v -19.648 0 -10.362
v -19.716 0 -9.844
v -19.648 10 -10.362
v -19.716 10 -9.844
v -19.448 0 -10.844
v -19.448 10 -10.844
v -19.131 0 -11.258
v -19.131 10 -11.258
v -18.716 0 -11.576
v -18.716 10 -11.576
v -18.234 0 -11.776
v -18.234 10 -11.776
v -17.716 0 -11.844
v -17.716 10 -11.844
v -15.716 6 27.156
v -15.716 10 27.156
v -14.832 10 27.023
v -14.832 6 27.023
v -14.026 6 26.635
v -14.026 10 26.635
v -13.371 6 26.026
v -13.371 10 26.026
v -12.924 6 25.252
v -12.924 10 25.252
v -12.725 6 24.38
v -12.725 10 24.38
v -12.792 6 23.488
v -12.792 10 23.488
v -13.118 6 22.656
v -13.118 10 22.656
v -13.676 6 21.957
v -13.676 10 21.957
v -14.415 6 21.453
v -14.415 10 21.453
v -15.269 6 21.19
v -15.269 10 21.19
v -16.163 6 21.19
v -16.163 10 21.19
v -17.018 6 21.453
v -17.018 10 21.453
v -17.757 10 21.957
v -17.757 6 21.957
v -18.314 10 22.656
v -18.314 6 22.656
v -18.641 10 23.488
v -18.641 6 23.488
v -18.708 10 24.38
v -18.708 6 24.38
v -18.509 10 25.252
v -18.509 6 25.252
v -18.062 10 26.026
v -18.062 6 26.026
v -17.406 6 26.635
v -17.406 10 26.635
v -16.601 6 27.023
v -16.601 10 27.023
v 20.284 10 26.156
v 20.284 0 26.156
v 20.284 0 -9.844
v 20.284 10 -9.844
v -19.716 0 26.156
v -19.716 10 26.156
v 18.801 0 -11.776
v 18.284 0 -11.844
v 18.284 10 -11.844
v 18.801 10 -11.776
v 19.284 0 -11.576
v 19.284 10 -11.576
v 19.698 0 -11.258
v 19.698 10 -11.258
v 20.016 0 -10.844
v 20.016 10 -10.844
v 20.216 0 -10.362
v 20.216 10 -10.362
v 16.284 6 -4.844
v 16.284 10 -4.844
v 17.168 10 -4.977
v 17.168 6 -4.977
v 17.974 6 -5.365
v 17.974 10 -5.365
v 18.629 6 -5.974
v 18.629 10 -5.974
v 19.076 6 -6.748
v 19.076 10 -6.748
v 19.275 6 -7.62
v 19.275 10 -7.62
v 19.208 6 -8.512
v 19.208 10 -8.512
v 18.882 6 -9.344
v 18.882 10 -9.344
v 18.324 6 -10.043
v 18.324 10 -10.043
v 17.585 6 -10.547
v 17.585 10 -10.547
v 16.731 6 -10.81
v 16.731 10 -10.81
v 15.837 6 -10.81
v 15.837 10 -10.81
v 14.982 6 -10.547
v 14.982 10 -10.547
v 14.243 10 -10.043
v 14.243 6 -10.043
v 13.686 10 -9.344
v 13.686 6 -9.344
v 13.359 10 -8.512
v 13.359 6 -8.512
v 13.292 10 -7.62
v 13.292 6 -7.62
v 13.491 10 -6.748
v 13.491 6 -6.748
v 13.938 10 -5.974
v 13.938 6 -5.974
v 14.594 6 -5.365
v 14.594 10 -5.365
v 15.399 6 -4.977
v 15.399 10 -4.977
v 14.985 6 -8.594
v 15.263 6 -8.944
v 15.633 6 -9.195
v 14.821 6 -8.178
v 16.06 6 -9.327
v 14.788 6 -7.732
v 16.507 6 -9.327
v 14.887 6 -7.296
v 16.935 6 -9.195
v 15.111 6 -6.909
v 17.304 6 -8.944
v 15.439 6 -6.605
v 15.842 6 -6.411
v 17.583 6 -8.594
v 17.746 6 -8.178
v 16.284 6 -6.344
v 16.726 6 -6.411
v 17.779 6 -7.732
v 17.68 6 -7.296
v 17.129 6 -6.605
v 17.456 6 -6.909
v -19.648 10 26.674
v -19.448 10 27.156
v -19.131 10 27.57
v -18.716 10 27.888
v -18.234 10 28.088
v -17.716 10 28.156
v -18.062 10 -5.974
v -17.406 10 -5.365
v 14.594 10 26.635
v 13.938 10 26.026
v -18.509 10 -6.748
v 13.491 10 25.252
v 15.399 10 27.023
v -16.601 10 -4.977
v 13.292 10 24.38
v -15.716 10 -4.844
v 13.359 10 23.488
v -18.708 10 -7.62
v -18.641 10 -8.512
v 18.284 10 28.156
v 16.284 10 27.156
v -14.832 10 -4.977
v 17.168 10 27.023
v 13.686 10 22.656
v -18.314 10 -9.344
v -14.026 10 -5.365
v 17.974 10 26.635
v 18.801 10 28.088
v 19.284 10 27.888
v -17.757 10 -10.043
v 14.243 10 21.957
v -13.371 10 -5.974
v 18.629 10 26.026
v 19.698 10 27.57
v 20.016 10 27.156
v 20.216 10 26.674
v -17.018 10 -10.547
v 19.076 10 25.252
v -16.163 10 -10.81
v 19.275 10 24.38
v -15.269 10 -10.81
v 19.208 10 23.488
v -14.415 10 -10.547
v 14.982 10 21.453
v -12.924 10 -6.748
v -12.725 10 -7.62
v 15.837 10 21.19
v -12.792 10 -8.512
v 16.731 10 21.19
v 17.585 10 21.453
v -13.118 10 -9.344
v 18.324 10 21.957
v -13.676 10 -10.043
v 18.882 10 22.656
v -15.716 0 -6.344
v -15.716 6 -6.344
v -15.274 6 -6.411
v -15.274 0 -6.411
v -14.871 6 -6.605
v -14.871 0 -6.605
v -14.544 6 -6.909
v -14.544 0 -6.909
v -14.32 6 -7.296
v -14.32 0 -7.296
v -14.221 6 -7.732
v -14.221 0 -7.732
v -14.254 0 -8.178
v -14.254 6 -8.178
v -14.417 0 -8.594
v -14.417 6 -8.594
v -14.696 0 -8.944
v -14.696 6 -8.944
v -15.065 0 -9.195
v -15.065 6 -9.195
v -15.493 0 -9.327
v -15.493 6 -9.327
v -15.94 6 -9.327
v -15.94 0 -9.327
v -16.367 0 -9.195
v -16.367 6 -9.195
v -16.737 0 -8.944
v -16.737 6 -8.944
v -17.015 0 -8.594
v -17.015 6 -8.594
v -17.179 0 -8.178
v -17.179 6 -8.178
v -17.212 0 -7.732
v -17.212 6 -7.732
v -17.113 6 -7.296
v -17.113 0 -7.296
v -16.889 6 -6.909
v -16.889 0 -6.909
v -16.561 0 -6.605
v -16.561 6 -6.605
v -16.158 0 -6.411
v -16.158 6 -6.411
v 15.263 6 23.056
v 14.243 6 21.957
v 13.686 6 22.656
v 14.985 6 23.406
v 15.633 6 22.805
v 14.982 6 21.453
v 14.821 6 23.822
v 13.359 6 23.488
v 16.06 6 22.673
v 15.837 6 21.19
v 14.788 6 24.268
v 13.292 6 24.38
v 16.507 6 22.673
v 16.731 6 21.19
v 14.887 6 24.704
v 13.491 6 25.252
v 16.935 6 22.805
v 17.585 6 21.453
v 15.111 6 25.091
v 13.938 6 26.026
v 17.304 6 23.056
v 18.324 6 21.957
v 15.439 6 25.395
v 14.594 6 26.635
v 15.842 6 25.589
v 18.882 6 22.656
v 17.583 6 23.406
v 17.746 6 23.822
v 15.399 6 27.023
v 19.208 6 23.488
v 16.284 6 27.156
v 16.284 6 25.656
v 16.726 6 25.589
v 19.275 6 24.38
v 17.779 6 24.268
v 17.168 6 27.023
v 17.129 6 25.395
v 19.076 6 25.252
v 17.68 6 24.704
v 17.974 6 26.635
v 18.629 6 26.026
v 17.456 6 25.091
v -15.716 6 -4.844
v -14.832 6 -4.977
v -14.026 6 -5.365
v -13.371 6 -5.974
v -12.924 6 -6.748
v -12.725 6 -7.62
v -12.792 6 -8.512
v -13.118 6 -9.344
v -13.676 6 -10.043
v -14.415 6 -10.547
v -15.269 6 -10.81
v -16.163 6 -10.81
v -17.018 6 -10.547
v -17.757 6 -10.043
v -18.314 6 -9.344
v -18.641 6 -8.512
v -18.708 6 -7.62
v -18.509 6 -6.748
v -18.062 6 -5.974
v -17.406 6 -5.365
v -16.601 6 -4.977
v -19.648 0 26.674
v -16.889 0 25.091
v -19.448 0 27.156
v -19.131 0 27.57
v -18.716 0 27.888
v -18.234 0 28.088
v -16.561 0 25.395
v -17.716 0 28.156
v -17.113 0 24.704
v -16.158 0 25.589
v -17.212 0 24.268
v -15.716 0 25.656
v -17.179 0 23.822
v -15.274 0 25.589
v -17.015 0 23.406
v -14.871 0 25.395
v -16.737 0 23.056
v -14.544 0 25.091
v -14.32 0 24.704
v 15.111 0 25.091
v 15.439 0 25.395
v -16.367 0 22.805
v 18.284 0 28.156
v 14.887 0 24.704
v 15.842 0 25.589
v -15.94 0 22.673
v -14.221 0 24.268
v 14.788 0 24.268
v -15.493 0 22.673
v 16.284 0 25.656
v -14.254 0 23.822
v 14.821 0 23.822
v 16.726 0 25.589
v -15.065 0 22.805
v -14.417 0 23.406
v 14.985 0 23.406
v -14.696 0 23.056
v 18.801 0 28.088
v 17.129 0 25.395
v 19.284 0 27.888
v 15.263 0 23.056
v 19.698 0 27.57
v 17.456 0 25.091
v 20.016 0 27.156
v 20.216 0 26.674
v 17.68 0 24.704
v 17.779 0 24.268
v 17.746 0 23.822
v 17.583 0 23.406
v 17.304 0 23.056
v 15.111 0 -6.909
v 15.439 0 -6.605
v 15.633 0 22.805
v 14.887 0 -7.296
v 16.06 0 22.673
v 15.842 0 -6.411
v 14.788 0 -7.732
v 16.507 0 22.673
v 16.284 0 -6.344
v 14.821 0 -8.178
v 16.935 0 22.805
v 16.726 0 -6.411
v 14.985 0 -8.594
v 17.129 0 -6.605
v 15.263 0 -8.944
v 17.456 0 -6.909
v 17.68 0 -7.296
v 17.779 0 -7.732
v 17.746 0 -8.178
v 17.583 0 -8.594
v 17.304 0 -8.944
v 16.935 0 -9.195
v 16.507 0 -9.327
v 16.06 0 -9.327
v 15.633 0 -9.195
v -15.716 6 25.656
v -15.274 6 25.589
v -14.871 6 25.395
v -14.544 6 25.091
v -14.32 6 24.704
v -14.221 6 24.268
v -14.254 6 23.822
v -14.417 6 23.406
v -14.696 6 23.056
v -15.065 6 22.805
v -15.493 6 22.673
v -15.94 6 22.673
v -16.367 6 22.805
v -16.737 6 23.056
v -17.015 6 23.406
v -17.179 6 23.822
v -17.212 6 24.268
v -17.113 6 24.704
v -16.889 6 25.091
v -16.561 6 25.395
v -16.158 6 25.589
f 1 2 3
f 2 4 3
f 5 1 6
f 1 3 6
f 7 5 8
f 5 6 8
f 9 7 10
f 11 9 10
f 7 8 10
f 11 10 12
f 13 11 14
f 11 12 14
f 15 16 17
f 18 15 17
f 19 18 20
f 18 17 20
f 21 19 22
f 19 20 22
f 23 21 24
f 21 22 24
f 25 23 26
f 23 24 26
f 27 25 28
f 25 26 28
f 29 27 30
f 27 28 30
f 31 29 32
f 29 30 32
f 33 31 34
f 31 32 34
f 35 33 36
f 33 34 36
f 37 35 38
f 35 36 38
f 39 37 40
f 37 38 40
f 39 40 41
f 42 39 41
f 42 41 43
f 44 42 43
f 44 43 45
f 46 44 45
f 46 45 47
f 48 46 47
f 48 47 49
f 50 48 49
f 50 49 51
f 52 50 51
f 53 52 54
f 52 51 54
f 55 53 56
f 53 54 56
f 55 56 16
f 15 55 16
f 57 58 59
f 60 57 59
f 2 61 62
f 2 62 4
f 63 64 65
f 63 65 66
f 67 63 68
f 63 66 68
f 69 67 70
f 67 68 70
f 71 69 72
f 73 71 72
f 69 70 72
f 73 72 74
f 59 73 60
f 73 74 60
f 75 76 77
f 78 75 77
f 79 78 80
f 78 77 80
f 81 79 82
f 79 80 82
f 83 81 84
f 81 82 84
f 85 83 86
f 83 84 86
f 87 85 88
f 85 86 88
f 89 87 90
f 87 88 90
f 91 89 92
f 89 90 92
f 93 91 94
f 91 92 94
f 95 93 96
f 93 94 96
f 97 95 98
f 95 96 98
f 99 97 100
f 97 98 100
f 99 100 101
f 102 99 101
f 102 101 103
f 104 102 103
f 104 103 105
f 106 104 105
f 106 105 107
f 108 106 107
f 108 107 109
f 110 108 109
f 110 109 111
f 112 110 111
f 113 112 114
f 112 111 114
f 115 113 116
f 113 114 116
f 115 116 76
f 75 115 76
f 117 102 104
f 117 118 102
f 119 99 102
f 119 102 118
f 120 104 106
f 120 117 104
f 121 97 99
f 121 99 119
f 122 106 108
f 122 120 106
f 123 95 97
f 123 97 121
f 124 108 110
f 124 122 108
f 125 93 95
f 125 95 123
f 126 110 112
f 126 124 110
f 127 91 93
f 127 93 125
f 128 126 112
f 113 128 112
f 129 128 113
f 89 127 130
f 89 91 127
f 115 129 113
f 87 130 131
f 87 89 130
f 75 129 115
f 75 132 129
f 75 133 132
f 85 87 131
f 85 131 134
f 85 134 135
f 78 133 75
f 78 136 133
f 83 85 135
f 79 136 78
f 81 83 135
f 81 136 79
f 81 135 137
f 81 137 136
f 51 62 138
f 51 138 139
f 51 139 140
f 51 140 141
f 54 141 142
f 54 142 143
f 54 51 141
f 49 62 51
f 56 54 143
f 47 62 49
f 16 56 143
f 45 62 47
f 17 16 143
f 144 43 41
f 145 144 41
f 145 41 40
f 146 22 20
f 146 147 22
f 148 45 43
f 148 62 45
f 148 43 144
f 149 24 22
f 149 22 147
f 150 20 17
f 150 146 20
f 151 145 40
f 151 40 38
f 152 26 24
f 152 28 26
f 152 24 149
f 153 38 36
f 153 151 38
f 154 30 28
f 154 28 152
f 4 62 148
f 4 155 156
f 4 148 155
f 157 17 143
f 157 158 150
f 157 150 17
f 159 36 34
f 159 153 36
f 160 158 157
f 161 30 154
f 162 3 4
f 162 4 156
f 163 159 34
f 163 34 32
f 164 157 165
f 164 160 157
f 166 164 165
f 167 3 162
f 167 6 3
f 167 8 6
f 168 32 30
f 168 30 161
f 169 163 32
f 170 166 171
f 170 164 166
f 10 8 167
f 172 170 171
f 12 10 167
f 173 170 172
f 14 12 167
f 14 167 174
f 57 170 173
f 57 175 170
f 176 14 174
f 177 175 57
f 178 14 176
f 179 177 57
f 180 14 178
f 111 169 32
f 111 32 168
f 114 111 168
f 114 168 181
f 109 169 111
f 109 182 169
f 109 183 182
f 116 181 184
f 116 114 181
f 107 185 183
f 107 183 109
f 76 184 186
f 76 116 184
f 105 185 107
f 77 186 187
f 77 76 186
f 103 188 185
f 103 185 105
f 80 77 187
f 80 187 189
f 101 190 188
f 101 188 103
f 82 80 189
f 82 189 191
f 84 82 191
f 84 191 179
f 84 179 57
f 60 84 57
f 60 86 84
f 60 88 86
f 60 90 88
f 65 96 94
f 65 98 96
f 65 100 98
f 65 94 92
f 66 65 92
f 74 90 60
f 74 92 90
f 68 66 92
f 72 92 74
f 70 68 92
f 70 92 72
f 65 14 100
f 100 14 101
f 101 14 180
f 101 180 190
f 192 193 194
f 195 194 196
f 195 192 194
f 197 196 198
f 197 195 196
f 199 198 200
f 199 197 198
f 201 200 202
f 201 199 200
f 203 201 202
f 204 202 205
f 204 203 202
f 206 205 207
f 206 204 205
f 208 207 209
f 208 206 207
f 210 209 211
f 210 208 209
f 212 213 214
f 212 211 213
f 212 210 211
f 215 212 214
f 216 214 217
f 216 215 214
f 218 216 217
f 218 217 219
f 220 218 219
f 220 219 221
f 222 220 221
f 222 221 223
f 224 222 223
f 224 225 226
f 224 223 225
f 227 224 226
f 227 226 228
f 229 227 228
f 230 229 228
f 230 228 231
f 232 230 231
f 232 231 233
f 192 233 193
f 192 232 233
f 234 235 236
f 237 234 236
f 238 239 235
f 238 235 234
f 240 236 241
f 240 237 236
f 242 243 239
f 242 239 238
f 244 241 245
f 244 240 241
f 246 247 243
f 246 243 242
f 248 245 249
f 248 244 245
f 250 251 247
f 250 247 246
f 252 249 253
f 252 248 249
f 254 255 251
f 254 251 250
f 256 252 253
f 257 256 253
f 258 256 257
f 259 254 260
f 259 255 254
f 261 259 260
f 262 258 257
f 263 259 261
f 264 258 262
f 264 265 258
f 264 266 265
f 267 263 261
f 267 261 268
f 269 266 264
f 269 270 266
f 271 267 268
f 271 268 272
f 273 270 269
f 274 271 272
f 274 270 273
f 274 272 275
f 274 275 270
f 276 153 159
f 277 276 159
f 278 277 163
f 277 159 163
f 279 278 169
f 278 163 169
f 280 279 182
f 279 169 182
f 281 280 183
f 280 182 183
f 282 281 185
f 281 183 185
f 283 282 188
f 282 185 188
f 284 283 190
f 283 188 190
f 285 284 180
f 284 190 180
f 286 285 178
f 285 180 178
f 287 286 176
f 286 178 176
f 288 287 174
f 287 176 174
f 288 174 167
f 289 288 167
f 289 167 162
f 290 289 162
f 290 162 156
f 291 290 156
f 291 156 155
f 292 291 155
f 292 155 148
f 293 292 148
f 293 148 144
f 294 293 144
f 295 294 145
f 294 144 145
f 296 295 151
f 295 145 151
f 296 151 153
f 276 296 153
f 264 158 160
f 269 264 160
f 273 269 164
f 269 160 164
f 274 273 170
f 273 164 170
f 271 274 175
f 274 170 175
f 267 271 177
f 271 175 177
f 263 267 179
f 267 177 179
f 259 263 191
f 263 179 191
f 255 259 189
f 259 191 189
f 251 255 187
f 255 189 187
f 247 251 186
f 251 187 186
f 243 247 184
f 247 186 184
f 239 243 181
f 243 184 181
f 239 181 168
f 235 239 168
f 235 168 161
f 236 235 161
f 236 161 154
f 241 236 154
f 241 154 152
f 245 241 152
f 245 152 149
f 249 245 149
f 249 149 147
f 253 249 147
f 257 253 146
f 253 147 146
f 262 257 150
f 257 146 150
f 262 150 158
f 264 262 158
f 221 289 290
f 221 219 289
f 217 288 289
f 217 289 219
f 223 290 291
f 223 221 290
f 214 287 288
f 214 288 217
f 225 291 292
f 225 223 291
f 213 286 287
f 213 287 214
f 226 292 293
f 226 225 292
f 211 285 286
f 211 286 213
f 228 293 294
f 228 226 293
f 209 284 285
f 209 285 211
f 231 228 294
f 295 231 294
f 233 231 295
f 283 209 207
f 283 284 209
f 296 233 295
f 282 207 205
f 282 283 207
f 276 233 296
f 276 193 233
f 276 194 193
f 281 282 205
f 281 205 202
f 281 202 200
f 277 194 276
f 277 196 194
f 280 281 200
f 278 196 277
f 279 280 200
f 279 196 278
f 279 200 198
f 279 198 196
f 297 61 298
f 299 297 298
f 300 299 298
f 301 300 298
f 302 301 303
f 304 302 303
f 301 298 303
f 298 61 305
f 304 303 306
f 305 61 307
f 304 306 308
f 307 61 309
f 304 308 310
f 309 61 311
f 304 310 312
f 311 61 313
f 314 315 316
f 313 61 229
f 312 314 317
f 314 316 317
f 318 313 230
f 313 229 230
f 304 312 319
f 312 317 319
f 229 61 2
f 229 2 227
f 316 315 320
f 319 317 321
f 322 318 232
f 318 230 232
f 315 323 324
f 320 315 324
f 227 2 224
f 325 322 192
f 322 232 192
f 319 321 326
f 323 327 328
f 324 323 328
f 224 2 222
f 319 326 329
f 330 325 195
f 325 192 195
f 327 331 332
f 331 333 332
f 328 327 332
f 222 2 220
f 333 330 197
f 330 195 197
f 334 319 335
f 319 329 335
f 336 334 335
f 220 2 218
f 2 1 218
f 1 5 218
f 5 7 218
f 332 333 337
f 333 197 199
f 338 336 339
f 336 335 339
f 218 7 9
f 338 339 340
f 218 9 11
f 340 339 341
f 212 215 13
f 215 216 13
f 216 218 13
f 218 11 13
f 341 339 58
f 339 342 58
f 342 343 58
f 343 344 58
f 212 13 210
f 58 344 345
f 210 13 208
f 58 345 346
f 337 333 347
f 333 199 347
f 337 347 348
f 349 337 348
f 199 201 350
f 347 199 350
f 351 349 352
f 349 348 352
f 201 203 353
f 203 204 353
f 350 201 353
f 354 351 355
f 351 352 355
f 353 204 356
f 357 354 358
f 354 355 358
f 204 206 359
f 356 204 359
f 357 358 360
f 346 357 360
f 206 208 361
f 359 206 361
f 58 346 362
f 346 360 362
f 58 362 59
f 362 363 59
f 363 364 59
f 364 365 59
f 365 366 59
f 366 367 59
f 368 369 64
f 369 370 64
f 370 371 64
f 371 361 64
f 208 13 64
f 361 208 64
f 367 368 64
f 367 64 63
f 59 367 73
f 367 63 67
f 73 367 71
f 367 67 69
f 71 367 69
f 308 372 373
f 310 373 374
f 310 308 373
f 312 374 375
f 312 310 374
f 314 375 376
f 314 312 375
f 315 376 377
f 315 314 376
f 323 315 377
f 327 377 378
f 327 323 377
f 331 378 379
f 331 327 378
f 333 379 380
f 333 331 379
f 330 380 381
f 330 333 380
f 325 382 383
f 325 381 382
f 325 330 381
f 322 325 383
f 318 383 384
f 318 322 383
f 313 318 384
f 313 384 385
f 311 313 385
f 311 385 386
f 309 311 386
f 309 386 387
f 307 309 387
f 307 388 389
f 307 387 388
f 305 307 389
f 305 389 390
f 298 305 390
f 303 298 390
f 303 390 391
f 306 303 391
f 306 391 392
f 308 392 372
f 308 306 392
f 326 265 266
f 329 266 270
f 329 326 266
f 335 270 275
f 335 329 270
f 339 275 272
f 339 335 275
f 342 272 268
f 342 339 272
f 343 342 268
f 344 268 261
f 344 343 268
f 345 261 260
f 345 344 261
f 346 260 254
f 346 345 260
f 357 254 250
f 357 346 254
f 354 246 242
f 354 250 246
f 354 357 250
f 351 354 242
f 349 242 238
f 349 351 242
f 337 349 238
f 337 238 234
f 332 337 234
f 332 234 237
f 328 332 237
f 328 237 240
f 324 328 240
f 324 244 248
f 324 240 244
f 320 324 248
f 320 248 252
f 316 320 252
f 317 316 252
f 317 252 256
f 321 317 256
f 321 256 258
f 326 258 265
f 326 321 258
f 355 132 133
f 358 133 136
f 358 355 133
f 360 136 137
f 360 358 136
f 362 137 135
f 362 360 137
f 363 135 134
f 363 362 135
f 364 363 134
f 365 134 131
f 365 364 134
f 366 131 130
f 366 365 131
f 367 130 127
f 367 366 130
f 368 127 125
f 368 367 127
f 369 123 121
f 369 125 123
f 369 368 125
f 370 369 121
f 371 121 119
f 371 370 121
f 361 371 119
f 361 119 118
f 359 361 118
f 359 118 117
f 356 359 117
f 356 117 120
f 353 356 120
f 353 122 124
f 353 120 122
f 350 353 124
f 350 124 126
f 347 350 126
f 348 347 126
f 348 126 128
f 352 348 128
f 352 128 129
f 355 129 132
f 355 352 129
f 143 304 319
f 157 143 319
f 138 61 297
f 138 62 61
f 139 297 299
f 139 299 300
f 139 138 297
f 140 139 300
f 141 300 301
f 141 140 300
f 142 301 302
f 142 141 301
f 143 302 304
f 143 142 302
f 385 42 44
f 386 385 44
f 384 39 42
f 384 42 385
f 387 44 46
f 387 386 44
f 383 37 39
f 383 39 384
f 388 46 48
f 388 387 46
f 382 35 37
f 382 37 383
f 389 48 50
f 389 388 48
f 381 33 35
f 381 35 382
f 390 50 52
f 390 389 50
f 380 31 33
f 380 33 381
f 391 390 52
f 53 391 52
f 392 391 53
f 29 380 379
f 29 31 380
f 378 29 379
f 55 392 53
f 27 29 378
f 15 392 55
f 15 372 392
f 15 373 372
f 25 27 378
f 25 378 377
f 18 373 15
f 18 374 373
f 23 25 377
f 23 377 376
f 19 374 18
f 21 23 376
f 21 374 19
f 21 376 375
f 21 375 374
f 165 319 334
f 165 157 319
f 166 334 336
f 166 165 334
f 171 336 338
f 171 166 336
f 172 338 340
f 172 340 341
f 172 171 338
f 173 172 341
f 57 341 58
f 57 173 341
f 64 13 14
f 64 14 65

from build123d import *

# Parameters (mm, degrees)
SKETCH_1_W          = 40
SKETCH_1_H          = 40
SKETCH_1_R          = 1.5
EXTRUDE_1_DEPTH     = 10
FILLET_1_R          = 2
SKETCH_2_R          = 3
CUT_EXTRUDE_1_DEPTH = 4


with BuildPart() as part:
    # Эскиз1 → Бобышка-Вытянуть1 (new body)
    with BuildSketch(Plane(origin=(0, 0, 0), x_dir=(1, 0, 0), z_dir=(0, 1, 0))):
        with Locations((0.283687943, -8.156028369)):
            Rectangle(SKETCH_1_W, SKETCH_1_H)
        with Locations(Location((-15.716312057, 7.843971631, 0), (0, 0, 270))):
            Circle(SKETCH_1_R, mode=Mode.SUBTRACT)
        with Locations(Location((16.283687943, 7.843971631, 0), (0, 0, 270))):
            Circle(SKETCH_1_R, mode=Mode.SUBTRACT)
        with Locations(Location((16.283687943, -24.156028369, 0), (0, 0, 270))):
            Circle(SKETCH_1_R, mode=Mode.SUBTRACT)
        with Locations(Location((-15.716312057, -24.156028369, 0), (0, 0, 270))):
            Circle(SKETCH_1_R, mode=Mode.SUBTRACT)
    extrude(amount=EXTRUDE_1_DEPTH)

    # Скругление1
    fillet_1_edges = [part.edges().sort_by_distance(p)[0] for p in [
        (-19.716312057, 5, -11.843971631),
        (20.283687943, 5, -11.843971631),
        (20.283687943, 5, 28.156028369),
        (-19.716312057, 5, 28.156028369),
    ]]
    fillet(fillet_1_edges, radius=FILLET_1_R)

    # Эскиз2 → Вырез-Вытянуть1 (cut)
    with BuildSketch(Plane(origin=(0, 10, 0), x_dir=(1, 0, 0), z_dir=(0, 1, 0))):
        with Locations(Location((-15.716312057, 7.843971631, 0), (0, 0, 270))):
            Circle(SKETCH_2_R)
        with Locations(Location((16.283687943, 7.843971631, 0), (0, 0, 270))):
            Circle(SKETCH_2_R)
        with Locations(Location((16.283687943, -24.156028369, 0), (0, 0, 270))):
            Circle(SKETCH_2_R)
        with Locations(Location((-15.716312057, -24.156028369, 0), (0, 0, 270))):
            Circle(SKETCH_2_R)
    extrude(amount=-CUT_EXTRUDE_1_DEPTH, mode=Mode.SUBTRACT)


solid = part.part
